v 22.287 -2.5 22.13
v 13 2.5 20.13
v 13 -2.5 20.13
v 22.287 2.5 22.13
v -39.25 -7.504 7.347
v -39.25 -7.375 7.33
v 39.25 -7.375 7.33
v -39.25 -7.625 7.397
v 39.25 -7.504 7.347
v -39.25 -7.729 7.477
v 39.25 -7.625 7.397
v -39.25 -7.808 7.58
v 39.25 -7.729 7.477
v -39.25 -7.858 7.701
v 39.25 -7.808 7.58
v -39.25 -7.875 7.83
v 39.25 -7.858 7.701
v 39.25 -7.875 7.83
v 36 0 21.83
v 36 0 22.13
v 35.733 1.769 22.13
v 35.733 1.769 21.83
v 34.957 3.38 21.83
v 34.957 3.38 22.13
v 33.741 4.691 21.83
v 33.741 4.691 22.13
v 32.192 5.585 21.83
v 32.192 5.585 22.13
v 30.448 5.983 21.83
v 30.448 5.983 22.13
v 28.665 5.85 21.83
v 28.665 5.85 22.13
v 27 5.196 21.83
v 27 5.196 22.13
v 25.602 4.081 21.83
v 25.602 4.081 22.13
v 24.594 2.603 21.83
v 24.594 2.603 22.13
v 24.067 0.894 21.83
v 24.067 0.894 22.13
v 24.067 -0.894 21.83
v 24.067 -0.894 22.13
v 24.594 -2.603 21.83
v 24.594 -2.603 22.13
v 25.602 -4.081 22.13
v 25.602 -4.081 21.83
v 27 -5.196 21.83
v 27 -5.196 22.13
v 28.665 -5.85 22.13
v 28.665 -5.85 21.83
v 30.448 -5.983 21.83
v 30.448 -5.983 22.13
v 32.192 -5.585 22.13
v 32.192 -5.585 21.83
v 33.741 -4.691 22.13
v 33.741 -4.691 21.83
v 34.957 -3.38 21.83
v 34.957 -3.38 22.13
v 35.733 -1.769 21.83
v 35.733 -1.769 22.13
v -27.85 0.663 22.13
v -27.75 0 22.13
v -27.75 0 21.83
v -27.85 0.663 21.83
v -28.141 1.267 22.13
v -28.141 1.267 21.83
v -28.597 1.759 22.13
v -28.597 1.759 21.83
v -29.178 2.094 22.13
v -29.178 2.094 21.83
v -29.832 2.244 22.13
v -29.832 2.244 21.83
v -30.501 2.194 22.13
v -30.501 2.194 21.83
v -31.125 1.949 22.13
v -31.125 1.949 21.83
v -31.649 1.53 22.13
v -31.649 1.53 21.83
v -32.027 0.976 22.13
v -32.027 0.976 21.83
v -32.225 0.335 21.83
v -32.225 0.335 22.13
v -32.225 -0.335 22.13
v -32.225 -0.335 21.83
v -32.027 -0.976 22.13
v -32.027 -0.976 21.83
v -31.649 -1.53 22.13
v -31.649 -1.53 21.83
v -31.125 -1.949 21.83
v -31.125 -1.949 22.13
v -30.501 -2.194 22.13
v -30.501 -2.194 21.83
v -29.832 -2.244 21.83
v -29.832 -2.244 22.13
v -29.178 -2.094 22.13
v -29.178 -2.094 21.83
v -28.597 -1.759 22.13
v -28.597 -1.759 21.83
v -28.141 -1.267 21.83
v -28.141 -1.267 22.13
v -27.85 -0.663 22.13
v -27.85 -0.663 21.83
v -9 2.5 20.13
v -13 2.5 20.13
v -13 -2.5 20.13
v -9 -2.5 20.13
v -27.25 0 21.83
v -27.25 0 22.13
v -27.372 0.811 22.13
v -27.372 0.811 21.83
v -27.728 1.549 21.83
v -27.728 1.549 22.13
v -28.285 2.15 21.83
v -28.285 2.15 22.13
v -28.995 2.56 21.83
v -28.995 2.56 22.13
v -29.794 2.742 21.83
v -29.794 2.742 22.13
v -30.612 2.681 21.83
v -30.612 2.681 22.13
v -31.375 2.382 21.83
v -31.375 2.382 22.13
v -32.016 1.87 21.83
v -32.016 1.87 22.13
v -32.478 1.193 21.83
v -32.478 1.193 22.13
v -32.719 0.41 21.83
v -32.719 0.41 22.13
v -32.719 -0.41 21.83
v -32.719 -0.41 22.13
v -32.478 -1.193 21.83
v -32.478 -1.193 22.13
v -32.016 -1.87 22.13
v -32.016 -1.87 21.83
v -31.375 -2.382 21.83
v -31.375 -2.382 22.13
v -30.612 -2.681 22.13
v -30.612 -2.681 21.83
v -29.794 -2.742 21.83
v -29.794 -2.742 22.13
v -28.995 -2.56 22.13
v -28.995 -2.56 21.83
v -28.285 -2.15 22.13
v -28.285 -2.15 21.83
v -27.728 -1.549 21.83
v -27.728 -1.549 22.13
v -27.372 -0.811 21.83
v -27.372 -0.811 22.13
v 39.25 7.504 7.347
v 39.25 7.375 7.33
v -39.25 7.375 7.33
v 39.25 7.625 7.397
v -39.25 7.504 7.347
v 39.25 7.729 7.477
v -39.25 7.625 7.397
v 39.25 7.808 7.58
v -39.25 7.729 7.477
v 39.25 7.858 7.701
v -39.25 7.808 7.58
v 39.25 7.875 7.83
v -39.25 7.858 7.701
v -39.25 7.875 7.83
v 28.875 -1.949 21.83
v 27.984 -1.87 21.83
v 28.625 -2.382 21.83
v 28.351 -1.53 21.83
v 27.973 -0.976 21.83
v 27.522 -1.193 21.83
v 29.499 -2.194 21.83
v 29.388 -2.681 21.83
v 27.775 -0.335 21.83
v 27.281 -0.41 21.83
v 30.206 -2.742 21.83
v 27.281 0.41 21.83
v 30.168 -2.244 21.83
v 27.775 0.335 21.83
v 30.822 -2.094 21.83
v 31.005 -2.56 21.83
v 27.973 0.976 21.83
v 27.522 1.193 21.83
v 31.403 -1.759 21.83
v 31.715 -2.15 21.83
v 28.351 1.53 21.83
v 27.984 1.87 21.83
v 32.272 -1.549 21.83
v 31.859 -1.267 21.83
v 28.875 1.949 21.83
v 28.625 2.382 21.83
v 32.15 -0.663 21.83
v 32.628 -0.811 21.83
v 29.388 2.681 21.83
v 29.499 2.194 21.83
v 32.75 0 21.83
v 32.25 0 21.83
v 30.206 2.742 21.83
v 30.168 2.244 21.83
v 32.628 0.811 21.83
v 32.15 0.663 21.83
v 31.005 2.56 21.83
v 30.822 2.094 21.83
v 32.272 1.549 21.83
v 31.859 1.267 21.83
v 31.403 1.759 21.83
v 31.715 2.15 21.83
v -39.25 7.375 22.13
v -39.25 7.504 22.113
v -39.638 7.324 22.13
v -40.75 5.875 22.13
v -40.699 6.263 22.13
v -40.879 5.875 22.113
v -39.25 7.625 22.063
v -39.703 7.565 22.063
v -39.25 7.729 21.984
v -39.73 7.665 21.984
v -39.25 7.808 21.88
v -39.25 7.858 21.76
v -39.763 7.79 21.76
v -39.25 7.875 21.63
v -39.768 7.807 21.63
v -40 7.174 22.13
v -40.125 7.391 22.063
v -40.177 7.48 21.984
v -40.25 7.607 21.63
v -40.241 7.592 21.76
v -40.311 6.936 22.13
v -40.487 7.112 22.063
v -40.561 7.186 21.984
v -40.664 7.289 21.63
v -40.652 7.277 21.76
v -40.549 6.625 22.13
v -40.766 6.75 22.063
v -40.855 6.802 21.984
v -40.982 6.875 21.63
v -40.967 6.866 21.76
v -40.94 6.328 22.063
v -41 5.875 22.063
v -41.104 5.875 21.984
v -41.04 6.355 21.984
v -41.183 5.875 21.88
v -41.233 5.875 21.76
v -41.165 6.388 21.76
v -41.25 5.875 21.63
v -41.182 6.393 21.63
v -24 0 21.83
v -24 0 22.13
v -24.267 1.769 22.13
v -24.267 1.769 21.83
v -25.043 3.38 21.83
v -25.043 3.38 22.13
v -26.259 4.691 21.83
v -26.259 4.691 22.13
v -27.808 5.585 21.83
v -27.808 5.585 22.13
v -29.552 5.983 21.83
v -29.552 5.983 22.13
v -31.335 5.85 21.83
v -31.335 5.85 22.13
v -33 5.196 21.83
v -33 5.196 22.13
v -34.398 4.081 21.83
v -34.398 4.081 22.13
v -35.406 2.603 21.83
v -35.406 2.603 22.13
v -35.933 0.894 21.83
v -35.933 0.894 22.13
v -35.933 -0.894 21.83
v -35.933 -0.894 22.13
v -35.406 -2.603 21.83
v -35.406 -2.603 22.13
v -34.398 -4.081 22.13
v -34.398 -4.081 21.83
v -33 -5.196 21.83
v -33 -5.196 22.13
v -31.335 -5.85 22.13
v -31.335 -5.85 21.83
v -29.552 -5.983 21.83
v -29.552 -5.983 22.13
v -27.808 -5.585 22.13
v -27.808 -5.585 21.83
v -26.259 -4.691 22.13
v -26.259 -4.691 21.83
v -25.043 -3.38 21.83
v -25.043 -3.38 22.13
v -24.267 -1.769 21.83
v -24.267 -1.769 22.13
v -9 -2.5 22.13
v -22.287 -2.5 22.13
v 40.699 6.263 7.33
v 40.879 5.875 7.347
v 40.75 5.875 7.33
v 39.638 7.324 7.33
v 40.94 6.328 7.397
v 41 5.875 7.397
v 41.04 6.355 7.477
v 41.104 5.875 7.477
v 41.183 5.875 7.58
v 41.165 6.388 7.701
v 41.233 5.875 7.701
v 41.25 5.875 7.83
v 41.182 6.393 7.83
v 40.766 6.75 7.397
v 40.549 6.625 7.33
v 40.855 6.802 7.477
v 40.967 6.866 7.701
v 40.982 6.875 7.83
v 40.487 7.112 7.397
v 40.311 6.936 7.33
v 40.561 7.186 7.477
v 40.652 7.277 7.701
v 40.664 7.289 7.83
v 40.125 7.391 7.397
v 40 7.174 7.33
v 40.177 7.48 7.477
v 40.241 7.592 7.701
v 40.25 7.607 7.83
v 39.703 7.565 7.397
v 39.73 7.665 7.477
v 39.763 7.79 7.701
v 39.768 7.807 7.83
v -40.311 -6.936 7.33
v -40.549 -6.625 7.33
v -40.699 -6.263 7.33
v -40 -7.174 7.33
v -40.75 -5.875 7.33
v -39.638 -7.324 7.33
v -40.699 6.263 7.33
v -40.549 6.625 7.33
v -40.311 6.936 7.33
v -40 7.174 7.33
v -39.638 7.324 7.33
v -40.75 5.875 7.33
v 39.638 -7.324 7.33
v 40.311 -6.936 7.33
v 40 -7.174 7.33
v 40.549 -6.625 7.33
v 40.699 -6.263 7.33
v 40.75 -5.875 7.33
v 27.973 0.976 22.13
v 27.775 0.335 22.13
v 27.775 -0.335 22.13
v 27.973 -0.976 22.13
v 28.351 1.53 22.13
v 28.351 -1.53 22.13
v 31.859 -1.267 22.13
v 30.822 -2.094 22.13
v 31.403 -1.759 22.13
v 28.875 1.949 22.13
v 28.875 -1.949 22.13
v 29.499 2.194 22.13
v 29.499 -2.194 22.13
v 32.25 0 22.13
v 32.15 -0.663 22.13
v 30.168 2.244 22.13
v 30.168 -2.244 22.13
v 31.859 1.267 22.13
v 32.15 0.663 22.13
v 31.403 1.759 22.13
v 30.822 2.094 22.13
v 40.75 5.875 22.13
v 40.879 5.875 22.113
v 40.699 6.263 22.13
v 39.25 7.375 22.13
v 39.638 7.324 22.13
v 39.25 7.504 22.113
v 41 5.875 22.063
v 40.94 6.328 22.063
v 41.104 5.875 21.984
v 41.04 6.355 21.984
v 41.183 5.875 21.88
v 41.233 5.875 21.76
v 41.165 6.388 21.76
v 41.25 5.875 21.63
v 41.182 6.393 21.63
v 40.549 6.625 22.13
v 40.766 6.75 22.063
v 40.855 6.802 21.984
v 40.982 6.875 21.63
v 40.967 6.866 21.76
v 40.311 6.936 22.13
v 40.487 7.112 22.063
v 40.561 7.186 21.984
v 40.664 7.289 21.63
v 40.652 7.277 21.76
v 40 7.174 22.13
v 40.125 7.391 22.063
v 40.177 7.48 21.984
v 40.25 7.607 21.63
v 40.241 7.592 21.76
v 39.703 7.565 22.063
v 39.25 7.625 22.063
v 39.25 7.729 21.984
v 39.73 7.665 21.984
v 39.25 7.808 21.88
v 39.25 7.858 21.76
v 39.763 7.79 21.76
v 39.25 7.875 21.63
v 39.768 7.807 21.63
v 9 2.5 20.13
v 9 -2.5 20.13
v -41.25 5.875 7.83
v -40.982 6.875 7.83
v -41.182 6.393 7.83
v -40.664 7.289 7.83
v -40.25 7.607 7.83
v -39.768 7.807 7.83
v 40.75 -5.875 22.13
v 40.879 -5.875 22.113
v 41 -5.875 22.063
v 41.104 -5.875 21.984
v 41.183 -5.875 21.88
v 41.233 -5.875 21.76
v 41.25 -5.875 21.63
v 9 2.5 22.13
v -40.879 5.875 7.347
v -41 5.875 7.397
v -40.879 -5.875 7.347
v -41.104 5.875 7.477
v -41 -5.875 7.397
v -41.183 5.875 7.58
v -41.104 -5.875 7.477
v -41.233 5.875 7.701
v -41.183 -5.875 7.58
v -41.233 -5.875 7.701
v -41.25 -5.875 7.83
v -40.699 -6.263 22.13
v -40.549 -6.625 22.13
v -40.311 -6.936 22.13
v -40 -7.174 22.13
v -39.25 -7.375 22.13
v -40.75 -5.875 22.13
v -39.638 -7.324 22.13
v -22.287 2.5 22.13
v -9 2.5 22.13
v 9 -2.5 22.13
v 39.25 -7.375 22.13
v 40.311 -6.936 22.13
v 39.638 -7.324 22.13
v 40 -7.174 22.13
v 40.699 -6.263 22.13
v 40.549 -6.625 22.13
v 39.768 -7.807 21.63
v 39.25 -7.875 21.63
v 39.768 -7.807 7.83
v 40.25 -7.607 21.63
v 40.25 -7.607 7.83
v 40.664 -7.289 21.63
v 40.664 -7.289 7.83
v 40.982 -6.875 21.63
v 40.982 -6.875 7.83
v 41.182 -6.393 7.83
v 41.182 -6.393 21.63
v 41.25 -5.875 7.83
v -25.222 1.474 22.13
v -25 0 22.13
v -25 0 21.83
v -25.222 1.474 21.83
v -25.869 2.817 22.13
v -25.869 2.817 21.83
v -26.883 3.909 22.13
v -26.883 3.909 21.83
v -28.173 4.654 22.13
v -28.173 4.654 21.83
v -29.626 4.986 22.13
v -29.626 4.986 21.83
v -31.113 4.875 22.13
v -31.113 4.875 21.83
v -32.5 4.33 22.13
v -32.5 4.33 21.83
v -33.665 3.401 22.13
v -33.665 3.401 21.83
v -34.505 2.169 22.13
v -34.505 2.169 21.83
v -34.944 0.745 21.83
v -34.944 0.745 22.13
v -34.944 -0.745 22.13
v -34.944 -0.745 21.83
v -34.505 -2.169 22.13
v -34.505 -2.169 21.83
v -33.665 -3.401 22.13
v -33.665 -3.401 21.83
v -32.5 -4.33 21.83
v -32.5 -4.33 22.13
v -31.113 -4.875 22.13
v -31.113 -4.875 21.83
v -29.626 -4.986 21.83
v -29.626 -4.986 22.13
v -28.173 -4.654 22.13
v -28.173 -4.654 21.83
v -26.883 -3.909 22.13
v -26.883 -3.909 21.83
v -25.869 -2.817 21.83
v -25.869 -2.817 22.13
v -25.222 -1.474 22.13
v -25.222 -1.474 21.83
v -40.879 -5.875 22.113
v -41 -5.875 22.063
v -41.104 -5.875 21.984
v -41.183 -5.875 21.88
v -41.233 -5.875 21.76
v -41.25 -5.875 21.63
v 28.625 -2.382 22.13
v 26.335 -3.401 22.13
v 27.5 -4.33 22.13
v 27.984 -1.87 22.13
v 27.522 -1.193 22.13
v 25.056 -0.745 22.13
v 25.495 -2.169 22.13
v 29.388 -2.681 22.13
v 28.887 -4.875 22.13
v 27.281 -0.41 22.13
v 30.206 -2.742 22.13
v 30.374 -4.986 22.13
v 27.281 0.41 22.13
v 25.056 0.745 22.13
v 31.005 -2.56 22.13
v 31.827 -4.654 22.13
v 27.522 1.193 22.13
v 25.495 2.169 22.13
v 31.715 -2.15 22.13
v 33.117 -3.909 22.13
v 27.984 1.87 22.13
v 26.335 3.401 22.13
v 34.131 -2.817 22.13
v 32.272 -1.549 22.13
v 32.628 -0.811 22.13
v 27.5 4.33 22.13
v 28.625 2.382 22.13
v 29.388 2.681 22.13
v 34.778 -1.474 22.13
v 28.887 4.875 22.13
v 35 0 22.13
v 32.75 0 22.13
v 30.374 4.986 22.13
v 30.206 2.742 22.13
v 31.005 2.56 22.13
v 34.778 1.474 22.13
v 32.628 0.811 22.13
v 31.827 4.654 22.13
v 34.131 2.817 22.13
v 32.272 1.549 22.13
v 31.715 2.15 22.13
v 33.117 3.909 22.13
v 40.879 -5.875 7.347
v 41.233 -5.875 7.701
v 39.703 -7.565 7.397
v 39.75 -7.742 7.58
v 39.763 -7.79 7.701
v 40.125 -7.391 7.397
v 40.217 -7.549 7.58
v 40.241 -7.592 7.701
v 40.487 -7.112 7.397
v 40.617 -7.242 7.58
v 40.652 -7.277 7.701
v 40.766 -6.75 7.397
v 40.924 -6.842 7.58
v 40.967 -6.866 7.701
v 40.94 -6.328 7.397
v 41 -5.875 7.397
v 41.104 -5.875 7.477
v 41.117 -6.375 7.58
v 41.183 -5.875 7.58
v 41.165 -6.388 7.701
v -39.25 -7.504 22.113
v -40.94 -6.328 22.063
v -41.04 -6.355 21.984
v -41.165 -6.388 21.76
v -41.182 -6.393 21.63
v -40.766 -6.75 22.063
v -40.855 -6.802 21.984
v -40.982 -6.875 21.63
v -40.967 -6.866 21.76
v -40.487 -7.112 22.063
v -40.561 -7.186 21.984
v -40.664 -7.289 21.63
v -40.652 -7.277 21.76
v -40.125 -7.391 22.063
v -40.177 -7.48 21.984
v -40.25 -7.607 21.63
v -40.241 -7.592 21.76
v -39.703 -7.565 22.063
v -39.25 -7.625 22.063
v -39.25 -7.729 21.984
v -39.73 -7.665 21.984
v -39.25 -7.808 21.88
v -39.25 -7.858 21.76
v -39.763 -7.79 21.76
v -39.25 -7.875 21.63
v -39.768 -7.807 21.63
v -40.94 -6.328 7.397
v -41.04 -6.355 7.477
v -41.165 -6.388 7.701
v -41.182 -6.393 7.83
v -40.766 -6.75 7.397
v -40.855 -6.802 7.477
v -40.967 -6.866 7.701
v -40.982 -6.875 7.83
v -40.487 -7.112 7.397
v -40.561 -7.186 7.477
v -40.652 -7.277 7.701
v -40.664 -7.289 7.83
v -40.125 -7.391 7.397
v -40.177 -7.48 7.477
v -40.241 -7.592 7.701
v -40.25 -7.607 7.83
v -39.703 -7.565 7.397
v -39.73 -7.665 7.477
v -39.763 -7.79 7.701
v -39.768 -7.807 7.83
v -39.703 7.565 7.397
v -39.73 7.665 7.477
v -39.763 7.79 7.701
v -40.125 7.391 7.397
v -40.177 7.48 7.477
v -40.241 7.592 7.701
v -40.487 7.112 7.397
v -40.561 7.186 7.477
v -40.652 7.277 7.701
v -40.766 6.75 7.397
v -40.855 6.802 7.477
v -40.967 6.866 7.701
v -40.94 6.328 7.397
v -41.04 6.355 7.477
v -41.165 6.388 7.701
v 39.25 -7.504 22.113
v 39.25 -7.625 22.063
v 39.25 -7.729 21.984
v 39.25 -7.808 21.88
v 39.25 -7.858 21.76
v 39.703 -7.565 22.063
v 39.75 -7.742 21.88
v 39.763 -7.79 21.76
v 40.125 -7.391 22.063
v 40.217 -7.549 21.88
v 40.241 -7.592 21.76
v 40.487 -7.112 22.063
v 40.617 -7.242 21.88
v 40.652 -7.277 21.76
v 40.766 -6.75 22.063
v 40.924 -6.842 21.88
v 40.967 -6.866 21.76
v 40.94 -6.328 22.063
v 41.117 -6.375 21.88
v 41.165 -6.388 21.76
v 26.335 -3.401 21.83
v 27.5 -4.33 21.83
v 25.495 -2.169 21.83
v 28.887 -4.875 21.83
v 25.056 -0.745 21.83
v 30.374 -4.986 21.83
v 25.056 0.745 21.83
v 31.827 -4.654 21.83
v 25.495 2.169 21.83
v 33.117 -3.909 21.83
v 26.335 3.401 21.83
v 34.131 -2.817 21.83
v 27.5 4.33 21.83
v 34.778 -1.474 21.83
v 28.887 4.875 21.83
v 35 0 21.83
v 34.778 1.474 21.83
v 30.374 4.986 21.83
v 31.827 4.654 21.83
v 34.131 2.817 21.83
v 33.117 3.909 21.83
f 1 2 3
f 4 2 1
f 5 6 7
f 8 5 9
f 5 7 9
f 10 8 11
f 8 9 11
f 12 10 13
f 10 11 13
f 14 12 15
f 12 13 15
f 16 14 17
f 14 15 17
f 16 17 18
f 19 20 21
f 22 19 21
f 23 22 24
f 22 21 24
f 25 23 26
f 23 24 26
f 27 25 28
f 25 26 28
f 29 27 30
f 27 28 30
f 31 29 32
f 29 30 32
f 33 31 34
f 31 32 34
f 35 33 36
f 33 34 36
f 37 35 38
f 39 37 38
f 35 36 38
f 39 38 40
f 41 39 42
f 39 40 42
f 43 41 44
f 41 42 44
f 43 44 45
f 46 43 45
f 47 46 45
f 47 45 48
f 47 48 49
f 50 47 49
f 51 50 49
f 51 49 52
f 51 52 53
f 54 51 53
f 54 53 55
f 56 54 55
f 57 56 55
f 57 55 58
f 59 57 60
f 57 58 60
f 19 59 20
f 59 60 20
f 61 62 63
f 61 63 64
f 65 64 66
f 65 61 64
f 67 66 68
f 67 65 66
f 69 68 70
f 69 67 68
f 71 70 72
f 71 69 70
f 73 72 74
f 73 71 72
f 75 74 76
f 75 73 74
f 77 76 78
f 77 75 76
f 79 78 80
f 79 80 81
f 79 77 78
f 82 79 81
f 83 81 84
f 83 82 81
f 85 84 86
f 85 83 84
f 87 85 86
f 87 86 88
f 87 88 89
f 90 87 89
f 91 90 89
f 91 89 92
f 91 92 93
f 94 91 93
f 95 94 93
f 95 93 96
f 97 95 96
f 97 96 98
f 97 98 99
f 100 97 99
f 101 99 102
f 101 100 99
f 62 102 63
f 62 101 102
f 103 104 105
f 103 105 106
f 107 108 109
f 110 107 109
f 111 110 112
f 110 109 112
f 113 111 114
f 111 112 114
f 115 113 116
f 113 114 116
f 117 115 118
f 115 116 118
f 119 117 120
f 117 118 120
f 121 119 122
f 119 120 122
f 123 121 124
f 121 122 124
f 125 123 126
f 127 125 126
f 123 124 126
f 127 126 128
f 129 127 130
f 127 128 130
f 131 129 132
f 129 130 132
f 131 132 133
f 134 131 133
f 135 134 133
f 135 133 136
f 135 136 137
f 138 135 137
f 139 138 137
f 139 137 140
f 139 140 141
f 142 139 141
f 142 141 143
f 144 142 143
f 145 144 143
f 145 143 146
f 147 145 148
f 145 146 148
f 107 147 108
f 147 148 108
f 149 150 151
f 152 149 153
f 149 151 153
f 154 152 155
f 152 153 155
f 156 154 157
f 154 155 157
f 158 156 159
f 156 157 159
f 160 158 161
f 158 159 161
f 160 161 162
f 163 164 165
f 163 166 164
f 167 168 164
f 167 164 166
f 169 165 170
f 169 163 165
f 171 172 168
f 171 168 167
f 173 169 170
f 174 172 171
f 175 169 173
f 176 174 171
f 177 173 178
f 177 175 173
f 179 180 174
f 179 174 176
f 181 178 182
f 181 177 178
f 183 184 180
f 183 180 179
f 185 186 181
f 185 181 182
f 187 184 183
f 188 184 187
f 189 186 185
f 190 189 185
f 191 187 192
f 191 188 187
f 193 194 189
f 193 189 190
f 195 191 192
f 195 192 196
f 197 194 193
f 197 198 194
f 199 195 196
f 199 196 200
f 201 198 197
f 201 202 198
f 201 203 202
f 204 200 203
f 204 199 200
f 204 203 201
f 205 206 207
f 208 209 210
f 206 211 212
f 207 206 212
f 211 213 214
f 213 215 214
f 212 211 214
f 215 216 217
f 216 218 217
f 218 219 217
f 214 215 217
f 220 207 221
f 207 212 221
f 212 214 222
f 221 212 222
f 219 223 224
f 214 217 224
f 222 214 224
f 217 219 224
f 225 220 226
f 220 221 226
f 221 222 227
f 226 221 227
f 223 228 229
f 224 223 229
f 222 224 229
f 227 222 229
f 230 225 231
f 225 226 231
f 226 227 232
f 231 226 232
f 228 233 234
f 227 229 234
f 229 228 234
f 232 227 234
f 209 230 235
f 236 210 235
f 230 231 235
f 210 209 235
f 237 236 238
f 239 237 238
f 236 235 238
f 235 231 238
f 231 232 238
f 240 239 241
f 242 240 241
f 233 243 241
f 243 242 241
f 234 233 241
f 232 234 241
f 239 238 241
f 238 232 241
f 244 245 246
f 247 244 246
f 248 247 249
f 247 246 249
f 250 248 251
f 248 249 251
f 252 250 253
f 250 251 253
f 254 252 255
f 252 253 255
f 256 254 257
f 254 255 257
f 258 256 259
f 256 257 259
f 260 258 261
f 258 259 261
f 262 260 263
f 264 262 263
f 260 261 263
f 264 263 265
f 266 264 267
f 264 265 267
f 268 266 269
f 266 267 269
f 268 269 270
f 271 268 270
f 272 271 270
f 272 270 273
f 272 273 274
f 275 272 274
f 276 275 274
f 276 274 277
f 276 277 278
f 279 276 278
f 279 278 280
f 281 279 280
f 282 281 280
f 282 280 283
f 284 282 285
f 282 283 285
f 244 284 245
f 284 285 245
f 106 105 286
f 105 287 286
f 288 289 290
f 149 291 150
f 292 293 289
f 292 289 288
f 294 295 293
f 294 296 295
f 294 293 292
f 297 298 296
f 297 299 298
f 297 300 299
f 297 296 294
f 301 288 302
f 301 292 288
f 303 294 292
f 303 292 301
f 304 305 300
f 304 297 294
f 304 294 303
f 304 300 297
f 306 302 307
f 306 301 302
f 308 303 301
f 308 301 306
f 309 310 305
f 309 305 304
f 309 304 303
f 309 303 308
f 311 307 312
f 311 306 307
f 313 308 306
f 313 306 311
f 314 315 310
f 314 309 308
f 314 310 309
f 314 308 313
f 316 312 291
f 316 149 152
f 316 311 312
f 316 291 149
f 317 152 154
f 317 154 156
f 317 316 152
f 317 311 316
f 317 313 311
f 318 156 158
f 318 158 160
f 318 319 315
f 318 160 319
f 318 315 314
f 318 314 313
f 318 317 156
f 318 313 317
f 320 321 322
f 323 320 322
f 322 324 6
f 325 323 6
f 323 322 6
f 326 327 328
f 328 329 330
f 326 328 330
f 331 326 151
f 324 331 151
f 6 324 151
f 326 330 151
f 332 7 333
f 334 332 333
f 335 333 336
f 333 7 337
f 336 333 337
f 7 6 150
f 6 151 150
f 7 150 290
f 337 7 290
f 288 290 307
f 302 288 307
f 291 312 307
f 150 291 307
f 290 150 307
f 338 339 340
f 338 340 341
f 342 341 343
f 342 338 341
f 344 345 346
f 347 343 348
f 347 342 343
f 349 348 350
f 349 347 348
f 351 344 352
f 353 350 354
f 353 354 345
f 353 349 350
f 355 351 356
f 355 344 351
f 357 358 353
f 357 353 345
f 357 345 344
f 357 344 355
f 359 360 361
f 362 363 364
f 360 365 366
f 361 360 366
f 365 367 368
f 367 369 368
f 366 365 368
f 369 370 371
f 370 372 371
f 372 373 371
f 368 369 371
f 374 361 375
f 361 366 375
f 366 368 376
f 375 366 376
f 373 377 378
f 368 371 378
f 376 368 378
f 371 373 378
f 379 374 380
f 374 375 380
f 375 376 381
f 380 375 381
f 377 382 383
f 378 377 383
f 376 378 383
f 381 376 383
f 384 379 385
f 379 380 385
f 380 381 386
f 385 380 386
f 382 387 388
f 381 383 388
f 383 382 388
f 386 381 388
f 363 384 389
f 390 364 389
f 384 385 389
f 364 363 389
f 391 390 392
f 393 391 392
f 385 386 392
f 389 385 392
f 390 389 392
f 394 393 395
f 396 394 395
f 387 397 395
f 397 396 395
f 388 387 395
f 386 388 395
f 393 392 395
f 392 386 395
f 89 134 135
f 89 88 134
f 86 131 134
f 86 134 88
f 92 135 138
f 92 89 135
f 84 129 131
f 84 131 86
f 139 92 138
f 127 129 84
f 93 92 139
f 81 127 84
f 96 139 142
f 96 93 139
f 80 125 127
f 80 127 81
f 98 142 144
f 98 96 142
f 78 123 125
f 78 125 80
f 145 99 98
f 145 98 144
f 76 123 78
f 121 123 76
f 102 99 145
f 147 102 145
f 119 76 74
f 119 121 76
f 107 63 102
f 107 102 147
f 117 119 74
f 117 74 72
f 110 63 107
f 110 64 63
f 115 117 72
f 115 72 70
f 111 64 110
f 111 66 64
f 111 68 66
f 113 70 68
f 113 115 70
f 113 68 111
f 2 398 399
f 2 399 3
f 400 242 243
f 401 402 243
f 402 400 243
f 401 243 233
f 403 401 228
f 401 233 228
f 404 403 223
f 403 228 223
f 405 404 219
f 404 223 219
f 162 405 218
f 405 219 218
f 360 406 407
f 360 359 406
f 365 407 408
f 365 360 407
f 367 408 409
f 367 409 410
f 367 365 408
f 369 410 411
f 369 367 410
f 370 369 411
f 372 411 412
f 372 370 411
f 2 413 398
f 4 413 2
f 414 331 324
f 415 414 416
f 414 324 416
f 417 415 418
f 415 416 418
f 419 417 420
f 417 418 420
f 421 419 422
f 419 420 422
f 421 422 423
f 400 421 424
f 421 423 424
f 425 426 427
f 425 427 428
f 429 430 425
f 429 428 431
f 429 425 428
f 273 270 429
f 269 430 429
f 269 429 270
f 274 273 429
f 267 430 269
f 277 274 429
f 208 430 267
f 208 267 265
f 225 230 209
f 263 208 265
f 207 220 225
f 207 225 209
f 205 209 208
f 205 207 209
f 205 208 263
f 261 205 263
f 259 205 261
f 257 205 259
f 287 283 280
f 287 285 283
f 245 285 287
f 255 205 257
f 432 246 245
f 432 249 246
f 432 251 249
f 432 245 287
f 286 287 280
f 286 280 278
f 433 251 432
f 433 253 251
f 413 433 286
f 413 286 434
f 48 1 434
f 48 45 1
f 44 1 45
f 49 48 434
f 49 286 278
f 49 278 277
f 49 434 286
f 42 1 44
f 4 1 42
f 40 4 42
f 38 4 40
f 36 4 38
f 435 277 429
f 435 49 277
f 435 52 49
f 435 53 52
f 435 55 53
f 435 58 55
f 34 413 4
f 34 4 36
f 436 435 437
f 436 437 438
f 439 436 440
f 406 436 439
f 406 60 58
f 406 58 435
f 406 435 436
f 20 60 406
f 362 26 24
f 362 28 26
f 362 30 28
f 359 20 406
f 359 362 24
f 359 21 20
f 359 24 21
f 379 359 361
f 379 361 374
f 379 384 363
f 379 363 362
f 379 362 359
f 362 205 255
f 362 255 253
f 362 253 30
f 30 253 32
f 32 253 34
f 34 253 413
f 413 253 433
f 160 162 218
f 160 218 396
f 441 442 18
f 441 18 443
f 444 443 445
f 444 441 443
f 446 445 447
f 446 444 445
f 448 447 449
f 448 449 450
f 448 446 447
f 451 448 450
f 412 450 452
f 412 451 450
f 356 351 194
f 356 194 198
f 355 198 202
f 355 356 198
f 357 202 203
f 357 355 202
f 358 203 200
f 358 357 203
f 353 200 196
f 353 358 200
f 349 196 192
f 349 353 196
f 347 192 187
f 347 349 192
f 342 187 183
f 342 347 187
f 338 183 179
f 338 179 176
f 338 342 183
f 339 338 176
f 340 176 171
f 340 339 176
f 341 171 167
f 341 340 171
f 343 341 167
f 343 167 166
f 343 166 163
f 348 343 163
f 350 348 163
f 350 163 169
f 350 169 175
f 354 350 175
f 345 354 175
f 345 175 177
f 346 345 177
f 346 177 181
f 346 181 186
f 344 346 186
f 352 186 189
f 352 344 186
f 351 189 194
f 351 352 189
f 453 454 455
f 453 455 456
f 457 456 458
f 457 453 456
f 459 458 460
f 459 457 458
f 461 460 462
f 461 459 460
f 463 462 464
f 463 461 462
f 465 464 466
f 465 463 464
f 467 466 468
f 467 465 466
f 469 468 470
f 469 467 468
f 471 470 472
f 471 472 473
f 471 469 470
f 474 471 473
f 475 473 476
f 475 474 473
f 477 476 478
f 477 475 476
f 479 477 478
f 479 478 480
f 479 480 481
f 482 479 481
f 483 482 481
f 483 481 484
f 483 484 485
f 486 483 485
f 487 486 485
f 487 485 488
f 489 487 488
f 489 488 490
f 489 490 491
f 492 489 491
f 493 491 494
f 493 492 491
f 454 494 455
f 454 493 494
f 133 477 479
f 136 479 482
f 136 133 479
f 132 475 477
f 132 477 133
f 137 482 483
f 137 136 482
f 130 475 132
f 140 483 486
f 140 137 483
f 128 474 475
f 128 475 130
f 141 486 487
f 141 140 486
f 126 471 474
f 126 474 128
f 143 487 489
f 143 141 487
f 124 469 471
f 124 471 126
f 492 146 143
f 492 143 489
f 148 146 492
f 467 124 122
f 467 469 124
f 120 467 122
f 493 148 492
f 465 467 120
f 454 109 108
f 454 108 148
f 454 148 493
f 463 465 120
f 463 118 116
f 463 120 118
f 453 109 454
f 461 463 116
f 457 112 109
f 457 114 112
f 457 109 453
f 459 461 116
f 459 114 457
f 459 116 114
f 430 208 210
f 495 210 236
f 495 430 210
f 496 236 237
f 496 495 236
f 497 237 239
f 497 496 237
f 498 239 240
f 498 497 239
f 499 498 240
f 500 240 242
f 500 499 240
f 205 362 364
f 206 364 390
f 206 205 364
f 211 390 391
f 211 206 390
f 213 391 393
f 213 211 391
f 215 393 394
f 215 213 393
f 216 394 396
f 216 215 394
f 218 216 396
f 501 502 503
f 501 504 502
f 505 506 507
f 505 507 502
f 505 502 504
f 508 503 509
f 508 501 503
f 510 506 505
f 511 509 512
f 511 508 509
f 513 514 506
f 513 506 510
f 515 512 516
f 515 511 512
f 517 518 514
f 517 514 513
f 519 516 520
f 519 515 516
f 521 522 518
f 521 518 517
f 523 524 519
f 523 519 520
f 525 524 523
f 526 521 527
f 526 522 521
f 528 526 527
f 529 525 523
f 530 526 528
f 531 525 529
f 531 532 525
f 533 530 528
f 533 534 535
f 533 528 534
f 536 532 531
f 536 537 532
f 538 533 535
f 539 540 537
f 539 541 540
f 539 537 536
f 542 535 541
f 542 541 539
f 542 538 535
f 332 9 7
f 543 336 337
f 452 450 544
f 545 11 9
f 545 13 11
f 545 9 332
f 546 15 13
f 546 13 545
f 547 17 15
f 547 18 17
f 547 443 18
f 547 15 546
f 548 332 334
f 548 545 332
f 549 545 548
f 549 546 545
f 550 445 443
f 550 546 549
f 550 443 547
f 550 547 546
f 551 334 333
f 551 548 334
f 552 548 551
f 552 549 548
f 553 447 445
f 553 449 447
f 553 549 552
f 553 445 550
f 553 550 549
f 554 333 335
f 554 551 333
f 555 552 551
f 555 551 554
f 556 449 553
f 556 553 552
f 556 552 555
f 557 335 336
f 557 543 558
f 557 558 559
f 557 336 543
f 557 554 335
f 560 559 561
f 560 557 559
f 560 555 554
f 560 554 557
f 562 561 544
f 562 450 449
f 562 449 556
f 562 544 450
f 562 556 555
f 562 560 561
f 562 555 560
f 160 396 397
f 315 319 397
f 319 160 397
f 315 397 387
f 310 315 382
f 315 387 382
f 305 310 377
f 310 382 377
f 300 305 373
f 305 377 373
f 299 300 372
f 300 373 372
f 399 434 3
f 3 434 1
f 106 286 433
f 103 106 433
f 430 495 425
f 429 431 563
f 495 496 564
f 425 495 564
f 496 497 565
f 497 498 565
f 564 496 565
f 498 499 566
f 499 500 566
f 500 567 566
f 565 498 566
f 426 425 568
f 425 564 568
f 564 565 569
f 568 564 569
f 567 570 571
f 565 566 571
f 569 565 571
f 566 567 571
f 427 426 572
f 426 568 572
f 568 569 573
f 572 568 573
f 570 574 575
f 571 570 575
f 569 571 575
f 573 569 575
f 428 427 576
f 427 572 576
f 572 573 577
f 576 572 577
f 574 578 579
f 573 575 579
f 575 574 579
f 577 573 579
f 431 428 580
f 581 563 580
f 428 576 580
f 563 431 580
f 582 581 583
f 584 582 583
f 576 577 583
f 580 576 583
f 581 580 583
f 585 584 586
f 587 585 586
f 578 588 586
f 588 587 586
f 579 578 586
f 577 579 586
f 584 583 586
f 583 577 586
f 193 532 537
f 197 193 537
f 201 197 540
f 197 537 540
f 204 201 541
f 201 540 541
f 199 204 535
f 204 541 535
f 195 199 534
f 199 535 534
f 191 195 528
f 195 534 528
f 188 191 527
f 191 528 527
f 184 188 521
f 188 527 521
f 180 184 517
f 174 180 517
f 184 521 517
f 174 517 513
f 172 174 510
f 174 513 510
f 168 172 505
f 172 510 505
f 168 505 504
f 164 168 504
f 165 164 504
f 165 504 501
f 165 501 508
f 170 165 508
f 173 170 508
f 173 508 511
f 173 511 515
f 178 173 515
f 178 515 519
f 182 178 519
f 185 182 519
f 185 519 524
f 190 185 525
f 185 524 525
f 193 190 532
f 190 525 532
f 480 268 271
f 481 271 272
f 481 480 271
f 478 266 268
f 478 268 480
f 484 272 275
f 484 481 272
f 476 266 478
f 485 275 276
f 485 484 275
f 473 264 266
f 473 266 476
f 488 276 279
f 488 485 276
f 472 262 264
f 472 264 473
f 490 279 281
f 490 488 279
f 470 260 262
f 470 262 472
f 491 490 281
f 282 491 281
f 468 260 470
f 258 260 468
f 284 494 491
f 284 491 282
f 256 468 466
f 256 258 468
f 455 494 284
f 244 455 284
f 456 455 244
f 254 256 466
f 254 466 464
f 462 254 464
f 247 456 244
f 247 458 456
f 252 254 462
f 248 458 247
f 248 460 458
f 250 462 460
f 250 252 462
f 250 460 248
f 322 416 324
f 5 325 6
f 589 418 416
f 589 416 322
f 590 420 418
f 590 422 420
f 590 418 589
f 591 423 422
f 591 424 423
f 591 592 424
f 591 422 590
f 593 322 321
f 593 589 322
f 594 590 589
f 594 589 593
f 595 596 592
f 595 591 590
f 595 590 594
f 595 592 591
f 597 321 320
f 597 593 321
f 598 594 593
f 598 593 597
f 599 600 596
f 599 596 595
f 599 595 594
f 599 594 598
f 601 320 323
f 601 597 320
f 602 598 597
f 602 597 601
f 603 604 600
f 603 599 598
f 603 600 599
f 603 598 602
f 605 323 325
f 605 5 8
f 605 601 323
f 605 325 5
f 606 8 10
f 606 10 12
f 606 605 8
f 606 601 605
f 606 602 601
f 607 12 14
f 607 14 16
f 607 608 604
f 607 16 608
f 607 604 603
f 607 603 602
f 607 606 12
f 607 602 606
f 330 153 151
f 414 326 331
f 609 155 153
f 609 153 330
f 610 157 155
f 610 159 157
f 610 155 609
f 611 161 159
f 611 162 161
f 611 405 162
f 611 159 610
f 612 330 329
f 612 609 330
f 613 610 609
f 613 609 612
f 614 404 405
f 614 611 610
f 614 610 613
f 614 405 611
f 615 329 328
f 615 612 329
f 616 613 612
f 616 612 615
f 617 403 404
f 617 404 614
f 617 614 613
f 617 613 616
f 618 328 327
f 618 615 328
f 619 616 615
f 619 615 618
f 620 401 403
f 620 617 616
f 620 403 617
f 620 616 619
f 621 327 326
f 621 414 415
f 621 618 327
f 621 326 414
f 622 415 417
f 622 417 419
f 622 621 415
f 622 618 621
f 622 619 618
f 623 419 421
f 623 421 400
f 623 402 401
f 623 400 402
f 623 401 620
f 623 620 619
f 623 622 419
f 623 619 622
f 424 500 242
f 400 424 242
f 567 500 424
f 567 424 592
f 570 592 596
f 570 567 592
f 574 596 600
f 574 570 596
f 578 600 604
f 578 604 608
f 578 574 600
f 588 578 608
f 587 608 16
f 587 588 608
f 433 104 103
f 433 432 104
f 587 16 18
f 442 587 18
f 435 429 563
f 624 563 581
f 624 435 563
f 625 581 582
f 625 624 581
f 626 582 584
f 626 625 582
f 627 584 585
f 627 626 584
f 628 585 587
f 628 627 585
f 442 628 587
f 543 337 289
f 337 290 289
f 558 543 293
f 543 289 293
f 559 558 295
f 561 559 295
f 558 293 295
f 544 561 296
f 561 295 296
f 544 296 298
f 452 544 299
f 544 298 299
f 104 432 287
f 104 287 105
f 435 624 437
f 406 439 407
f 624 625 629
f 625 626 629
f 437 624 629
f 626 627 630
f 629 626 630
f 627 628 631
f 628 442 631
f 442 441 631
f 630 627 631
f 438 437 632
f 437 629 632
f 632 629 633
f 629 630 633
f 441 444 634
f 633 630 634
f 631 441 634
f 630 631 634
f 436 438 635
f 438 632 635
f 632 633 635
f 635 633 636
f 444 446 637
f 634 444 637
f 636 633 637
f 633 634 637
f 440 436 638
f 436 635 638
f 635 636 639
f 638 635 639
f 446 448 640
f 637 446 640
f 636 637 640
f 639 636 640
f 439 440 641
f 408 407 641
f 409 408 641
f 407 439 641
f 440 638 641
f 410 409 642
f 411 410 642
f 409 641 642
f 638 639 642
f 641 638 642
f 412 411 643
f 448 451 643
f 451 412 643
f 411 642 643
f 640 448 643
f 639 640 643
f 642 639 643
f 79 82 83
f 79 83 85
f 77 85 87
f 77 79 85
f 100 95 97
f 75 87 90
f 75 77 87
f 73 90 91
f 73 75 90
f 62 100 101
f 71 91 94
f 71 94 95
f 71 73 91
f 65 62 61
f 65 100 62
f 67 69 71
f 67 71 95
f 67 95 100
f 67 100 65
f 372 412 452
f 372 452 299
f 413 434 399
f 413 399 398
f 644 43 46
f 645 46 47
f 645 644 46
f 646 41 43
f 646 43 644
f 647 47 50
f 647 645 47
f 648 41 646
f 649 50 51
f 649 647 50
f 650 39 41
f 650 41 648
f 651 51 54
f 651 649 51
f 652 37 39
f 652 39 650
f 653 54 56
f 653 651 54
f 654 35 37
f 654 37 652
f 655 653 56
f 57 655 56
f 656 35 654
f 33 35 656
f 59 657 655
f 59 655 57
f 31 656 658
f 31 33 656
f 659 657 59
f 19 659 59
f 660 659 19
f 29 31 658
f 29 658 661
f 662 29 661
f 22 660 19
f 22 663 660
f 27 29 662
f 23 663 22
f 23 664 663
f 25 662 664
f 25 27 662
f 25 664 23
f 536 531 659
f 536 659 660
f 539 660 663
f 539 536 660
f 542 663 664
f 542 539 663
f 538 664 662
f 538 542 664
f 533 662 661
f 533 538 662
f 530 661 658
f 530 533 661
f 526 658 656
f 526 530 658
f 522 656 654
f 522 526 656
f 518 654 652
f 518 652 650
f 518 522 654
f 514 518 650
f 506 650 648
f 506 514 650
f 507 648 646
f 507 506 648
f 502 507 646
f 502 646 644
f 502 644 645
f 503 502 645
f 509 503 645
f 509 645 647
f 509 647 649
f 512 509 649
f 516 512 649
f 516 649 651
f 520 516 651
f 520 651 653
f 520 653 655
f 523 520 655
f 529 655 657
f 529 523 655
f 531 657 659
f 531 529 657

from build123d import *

# Parameters (mm, degrees)
SKETCH_1_W          = 165
SKETCH_1_H          = 31.5
EXTRUDE_1_DEPTH     = 29.6
SKETCH_2_R          = 12
SKETCH_2_R_2        = 10
SKETCH_2_R_3        = 5.5
SKETCH_2_R_4        = 4.5
CUT_EXTRUDE_1_DEPTH = 0.6
FILLET_1_R          = 4
FILLET_2_R          = 1
SKETCH_3_W          = 8
SKETCH_3_H          = 10
CUT_EXTRUDE_2_DEPTH = 4
CUT_EXTRUDE_3_DEPTH = 10
SCALE_1_SCALE       = 0.5


with BuildPart() as part:
    # 草图1 → 凸台-拉伸1 (new body)
    with BuildSketch(Plane.XY):
        Rectangle(SKETCH_1_W, SKETCH_1_H)
    extrude(amount=EXTRUDE_1_DEPTH)

    # 草图2 → 切除-拉伸1 (cut)
    # profile 1 of 4: a face of its own
    with BuildSketch(Plane.XY.offset(29.6)):
        with Locations((-60, 0)):
            Circle(SKETCH_2_R)
        with Locations((-60, 0)):
            Circle(SKETCH_2_R_2, mode=Mode.SUBTRACT)
    # profile 2 of 4: a face of its own
    with BuildSketch(Plane.XY.offset(29.6)):
        with Locations((-60, 0)):
            Circle(SKETCH_2_R_3)
        with Locations((-60, 0)):
            Circle(SKETCH_2_R_4, mode=Mode.SUBTRACT)
    # profile 3 of 4: a face of its own
    with BuildSketch(Plane.XY.offset(29.6)):
        with Locations((60, 0)):
            Circle(SKETCH_2_R)
        with Locations((60, 0)):
            Circle(SKETCH_2_R_2, mode=Mode.SUBTRACT)
    # profile 4 of 4: a face of its own
    with BuildSketch(Plane.XY.offset(29.6)):
        with Locations((60, 0)):
            Circle(SKETCH_2_R_3)
        with Locations((60, 0)):
            Circle(SKETCH_2_R_4, mode=Mode.SUBTRACT)
    extrude(amount=-CUT_EXTRUDE_1_DEPTH, mode=Mode.SUBTRACT)

    # 圆角1
    fillet_1_edges = [part.edges().sort_by_distance(p)[0] for p in [
        (82.5, -15.75, 14.8),
        (-82.5, -15.75, 14.8),
        (-82.5, 15.75, 14.8),
        (82.5, 15.75, 14.8),
    ]]
    fillet(fillet_1_edges, radius=FILLET_1_R)

    # 圆角2
    fillet_2_edges = [part.edges().sort_by_distance(p)[0] for p in [
        (82.5, 0, 0),
        (82.5, 0, 29.6),
        (0, -15.75, 0),
        (-82.5, 0, 0),
        (0, 15.75, 0),
        (-81.328427125, 14.578427125, 0),
        (-81.328427125, -14.578427125, 0),
        (81.328427125, 14.578427125, 0),
        (81.328427125, -14.578427125, 0),
        (0, -15.75, 29.6),
        (0, 15.75, 29.6),
        (-82.5, 0, 29.6),
        (-81.328427125, 14.578427125, 29.6),
        (-81.328427125, -14.578427125, 29.6),
        (81.328427125, 14.578427125, 29.6),
        (81.328427125, -14.578427125, 29.6),
    ]]
    fillet(fillet_2_edges, radius=FILLET_2_R)

    # 草图3 → 切除-拉伸2 (cut)
    with BuildSketch(Plane.XY.offset(29.6)):
        with Locations((-22, 0)):
            Rectangle(SKETCH_3_W, SKETCH_3_H)
        with Locations((22, 0)):
            Rectangle(SKETCH_3_W, SKETCH_3_H)
    extrude(amount=-CUT_EXTRUDE_2_DEPTH, mode=Mode.SUBTRACT)

    # 草图4 → 切除-拉伸3 (cut)
    with BuildSketch(Plane.XZ.offset(-5)):
        Polygon((26, 25.6), (44.574175621, 29.6), (26, 29.6), align=None)
        Polygon((-26, 29.6), (-44.574175621, 29.6), (-26, 25.6), align=None)
    extrude(amount=CUT_EXTRUDE_3_DEPTH, mode=Mode.SUBTRACT)


with BuildPart() as part_1:
    # 缩放比例1: scaled about (0, 0, 14.660574606)
    add(part.part.scale(SCALE_1_SCALE).moved(Location((0, 0, 7.330287303))))


solid = part_1.part
